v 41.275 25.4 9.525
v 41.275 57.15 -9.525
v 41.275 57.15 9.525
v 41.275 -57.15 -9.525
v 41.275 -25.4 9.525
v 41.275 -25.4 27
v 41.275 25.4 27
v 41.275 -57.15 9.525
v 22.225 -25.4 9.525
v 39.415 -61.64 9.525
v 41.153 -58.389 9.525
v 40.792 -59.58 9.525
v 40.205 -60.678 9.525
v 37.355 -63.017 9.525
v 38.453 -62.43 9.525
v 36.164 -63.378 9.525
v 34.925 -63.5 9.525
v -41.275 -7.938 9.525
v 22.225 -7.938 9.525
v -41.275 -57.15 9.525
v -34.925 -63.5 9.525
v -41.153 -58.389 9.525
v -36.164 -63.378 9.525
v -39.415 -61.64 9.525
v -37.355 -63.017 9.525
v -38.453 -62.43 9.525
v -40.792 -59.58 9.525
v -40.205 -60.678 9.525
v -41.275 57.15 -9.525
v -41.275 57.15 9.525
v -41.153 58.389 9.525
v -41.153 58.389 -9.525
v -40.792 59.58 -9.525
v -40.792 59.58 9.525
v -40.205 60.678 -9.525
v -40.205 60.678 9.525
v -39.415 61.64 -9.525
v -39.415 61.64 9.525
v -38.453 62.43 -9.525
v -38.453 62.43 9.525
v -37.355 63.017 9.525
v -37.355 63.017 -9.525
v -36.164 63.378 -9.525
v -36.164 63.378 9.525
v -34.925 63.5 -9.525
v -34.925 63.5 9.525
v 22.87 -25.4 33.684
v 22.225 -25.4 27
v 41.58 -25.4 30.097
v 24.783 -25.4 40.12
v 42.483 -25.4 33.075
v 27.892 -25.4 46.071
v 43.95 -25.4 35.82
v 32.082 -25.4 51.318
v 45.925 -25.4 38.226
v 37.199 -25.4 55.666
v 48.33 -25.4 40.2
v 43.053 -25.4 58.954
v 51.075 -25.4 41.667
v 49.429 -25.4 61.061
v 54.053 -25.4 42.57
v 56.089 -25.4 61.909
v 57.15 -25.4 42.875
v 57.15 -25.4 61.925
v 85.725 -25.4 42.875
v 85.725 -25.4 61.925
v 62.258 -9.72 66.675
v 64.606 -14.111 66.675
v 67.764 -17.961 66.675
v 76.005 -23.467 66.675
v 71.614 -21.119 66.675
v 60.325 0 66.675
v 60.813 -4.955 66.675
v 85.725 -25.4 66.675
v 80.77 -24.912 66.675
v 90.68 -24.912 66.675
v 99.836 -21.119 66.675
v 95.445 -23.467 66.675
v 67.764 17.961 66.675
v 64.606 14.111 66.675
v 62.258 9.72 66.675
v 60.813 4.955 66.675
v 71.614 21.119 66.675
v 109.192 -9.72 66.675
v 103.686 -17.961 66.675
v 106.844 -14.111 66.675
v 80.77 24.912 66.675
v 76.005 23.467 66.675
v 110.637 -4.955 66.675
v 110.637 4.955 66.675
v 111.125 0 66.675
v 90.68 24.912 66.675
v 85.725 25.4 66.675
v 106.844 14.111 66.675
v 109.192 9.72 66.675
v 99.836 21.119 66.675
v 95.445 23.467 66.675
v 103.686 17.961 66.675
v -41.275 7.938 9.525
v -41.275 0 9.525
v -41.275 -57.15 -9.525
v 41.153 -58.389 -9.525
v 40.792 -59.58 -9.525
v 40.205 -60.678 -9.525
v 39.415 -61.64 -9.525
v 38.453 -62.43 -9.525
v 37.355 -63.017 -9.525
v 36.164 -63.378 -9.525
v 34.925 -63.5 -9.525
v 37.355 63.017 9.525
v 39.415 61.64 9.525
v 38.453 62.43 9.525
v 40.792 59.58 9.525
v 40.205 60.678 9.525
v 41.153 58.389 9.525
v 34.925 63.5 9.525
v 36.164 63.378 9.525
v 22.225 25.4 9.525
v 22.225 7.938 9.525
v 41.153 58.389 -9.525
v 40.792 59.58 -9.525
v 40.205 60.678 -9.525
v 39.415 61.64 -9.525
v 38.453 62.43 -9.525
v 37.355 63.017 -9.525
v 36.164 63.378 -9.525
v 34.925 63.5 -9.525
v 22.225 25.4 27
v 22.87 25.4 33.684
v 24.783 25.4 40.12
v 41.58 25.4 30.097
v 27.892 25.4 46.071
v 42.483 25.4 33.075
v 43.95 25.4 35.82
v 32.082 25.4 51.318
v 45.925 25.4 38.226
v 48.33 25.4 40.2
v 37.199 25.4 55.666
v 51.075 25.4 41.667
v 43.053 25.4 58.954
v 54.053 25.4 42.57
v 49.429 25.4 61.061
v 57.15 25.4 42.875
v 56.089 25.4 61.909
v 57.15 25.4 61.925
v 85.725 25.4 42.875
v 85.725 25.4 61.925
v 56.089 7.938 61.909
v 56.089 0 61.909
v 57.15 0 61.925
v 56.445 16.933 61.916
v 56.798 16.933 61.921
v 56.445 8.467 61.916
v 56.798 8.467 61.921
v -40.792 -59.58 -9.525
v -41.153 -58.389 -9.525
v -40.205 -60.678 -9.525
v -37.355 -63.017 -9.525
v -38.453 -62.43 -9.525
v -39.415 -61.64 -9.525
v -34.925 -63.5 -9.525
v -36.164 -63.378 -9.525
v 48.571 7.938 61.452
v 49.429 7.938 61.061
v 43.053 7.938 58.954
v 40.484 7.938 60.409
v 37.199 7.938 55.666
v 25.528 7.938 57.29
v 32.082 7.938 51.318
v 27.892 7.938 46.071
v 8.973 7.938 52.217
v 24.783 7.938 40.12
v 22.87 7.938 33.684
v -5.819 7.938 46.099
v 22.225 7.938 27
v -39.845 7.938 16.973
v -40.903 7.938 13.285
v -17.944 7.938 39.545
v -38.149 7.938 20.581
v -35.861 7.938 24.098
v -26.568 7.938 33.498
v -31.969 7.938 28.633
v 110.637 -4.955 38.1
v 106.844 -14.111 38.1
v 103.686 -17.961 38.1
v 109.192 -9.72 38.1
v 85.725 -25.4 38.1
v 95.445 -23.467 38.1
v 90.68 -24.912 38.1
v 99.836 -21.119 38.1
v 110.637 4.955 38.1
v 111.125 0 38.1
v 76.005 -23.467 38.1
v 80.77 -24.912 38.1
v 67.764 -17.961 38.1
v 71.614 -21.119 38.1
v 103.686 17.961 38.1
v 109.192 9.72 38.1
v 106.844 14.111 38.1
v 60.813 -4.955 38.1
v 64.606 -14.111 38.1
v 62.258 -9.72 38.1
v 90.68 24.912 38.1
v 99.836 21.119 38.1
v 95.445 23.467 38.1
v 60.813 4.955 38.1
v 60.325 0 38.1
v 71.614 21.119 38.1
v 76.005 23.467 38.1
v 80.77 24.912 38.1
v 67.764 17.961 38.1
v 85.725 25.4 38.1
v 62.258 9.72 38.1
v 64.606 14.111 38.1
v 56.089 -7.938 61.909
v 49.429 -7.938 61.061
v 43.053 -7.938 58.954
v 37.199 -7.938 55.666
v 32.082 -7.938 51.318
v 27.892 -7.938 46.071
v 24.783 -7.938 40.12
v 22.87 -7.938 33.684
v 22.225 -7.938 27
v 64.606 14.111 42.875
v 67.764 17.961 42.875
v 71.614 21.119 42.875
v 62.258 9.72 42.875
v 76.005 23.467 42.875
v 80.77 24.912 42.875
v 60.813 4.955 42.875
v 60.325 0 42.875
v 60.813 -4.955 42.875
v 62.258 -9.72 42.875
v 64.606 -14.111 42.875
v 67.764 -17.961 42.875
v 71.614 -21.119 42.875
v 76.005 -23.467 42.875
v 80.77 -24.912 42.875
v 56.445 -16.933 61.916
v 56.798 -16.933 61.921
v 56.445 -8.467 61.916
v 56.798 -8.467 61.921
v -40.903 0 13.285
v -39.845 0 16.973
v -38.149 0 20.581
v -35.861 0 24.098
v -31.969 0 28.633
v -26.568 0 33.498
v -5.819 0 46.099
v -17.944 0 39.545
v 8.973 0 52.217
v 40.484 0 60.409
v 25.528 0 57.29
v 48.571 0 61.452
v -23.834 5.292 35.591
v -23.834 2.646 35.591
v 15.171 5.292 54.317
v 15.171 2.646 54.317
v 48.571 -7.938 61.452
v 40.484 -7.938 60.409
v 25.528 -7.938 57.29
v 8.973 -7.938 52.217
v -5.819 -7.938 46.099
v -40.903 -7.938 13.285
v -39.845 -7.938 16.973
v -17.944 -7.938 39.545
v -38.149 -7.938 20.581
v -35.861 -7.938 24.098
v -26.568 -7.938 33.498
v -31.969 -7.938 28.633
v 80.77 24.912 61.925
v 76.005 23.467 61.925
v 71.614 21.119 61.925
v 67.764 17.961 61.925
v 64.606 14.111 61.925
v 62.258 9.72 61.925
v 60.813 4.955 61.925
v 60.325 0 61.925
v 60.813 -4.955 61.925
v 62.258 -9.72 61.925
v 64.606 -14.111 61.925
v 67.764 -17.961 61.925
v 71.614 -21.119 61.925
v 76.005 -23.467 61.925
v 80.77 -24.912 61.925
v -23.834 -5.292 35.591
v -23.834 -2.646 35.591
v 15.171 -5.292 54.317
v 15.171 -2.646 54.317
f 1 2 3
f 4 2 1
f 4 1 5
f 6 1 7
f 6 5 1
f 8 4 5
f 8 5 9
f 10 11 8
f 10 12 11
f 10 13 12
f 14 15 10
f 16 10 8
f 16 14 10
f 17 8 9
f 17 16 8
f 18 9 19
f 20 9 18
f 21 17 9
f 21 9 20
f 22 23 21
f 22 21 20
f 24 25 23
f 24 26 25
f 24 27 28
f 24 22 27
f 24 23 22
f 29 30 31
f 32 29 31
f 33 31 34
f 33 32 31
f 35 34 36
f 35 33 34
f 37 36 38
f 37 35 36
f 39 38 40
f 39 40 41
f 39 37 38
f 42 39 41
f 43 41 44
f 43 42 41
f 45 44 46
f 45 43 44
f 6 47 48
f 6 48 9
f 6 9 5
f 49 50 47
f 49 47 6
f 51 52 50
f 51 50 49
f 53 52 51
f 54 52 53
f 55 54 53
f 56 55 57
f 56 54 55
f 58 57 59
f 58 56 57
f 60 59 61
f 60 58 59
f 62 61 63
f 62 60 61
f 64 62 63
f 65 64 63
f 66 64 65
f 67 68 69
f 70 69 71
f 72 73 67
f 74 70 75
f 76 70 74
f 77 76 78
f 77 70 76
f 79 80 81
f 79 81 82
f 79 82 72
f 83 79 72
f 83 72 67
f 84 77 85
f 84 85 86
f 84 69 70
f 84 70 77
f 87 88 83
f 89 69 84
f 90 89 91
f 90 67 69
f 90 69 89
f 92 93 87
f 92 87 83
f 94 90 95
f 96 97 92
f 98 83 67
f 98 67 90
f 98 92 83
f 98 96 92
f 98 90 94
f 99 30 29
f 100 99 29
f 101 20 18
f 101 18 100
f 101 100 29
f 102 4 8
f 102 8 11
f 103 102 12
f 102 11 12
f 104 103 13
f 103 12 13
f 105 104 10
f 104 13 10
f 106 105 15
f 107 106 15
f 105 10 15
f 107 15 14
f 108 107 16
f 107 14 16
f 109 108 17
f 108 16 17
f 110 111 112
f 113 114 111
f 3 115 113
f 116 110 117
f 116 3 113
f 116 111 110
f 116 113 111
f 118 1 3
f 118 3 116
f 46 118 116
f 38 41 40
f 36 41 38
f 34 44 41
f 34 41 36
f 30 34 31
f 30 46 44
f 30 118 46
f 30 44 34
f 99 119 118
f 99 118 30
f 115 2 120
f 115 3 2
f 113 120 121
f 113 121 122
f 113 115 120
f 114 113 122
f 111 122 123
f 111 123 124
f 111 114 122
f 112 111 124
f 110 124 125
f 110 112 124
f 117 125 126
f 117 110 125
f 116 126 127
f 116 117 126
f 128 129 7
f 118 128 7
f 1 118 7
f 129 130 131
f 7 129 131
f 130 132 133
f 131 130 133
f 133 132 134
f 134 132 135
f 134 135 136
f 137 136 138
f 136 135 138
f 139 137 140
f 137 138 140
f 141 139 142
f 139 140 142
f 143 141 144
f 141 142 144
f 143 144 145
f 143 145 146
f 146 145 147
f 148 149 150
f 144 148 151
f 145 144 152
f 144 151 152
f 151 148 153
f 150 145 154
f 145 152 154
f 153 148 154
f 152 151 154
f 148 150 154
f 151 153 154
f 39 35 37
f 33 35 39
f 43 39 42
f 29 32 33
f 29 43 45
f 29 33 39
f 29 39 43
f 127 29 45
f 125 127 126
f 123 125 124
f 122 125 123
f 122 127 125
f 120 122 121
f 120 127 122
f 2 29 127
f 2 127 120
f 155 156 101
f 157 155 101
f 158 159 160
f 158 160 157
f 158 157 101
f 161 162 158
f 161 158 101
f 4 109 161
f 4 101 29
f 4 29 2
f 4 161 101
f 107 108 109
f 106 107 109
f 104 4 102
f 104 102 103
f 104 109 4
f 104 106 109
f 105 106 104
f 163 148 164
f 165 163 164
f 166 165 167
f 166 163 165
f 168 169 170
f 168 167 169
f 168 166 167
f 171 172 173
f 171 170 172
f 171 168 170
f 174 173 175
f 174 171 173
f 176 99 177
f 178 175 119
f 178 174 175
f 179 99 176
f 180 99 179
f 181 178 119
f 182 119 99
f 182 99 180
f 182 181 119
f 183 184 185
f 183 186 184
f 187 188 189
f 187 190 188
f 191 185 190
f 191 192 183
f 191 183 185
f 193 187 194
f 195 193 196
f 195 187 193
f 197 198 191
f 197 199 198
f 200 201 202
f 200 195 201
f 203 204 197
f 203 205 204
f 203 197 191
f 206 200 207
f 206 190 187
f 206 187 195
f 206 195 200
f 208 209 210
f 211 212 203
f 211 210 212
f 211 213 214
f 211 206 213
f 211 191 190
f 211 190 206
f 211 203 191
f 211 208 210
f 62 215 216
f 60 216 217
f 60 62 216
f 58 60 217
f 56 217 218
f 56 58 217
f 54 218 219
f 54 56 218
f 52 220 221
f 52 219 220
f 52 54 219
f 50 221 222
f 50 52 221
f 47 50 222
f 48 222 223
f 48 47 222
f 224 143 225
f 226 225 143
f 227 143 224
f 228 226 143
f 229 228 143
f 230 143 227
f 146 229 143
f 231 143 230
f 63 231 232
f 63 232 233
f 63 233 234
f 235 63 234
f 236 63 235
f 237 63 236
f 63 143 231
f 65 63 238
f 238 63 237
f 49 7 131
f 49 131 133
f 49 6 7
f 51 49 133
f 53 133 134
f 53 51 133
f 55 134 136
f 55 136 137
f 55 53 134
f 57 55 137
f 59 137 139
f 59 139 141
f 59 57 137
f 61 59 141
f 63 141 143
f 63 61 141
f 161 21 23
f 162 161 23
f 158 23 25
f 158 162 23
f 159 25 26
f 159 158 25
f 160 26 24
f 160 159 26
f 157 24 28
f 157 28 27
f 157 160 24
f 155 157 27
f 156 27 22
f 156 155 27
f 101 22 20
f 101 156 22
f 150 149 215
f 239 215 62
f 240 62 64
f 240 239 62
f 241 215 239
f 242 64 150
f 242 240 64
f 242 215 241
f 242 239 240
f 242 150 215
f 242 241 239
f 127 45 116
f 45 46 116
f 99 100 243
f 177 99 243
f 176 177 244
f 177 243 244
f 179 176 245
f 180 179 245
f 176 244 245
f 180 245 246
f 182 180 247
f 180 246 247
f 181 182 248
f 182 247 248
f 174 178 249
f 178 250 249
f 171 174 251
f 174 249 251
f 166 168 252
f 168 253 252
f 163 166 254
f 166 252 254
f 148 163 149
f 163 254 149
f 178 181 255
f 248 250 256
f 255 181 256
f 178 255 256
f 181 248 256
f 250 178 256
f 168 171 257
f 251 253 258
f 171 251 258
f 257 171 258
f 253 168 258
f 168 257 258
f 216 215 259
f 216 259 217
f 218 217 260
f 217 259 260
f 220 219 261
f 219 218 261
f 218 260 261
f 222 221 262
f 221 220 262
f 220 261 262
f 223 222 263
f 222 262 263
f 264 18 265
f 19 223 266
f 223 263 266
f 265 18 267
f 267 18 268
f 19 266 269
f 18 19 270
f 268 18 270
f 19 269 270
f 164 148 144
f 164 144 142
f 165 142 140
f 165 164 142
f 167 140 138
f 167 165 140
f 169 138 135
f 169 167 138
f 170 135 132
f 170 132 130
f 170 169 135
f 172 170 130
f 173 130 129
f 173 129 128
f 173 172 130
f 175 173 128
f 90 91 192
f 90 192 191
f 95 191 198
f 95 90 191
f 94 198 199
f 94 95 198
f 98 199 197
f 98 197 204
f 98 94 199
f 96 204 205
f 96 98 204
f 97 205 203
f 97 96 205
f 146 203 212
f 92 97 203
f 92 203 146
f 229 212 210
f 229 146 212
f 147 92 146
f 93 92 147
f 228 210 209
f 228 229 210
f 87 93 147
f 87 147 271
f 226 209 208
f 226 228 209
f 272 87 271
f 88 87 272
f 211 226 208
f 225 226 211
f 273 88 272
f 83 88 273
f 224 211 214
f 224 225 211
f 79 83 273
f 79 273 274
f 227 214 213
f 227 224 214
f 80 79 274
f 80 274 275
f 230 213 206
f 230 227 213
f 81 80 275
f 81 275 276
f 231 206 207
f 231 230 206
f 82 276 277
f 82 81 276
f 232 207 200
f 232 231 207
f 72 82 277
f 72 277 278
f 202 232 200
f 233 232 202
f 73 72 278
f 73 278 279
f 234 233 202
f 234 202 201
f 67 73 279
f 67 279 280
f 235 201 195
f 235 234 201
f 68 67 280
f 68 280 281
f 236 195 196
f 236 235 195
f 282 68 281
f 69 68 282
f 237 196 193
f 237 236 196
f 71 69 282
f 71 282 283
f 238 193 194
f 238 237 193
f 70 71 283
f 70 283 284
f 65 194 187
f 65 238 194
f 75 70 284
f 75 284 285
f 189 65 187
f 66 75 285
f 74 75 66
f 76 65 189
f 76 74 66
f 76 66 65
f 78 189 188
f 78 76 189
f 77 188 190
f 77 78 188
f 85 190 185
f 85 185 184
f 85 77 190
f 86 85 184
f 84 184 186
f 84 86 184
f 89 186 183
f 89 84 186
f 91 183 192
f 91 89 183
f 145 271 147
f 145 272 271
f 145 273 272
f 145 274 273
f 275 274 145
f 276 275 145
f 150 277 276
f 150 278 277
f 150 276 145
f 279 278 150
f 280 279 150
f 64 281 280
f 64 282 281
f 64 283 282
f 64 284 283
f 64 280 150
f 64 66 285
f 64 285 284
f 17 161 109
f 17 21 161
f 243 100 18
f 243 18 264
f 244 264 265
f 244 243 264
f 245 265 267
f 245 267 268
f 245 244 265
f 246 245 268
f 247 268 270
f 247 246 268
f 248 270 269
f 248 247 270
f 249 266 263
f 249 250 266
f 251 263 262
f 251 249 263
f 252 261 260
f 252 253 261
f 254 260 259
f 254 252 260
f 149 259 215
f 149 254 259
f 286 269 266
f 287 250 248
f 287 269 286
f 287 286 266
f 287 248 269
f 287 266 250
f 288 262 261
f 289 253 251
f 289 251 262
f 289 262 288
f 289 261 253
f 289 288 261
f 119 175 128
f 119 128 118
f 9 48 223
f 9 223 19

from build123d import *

# Parameters (mm, degrees)
F1_DEPTH = 63.5
F0_W     = 25.4
F0_H     = 19.05
F2_DEPTH = 25.4
F3_DEPTH = 7.9375
F5_R     = 6.35


with BuildPart() as f1:
    # F0 (on Front) → F1 (new body, symmetric)
    with BuildSketch(Plane.XZ):
        Polygon((-41.275, -9.525), (41.275, -9.525), (41.275, 9.525), (22.225, 9.525), (-41.275, 9.525), align=None)
    extrude(amount=F1_DEPTH, both=True)

    # F0 (on Front) → F2 (join, symmetric)
    with BuildSketch(Plane.XZ):
        with Locations((73.025, 52.4002)):
            Rectangle(F0_W, F0_H)
        with BuildLine():
            Line((22.225, 9.525), (41.275, 9.525))
            Line((41.275, 9.525), (41.275, 27.0002))
            ThreePointArc((41.275, 27.0002), (45.9246798487, 38.2255201513), (57.15, 42.8752))
            Line((57.15, 42.8752), (60.325, 42.8752))
            Line((60.325, 42.8752), (60.325, 61.9252))
            Line((60.325, 61.9252), (57.15, 61.9252))
            add(Edge.make_bspline(
                [(56.0893351364, 61.9090902007), (56.4456274425, 61.9167445082), (56.7992126462, 61.9221202842), (57.15, 61.9252)],
                knots=[110.3910816618, 110.3910816618, 110.3910816618, 110.3910816618, 111.5045361635, 111.5045361635, 111.5045361635, 111.5045361635], degree=3))
            ThreePointArc((56.0893351364, 61.9090902007), (32.082098758, 51.3180114212), (22.225, 27.0002))
            Line((22.225, 27.0002), (22.225, 9.525))
        make_face()
    extrude(amount=F2_DEPTH, both=True)

    # F0 (on Front) → F3 (join, symmetric)
    with BuildSketch(Plane.XZ):
        with BuildLine():
            add(Edge.make_bspline(
                [(-41.275, 9.525), (-41.167300735, 37.9949573937), (20.7654911939, 61.1502201412), (56.0893351364, 61.9090902007)],
                knots=[0, 0, 0, 0, 110.3910816618, 110.3910816618, 110.3910816618, 110.3910816618], degree=3))
            Line((-41.275, 9.525), (22.225, 9.525))
            Line((22.225, 9.525), (22.225, 27.0002))
            ThreePointArc((22.225, 27.0002), (32.082098758, 51.3180114212), (56.0893351364, 61.9090902007))
        make_face()
    extrude(amount=F3_DEPTH, both=True)

    # F0 (on Front) → F4 (revolve)
    with BuildSketch(Plane.XZ):
        Polygon((85.725, 61.9252), (85.725, 42.8752), (85.725, 38.1), (111.125, 38.1), (111.125, 66.675), (85.725, 66.675), align=None)
    revolve(axis=Axis((85.725, 0, 52.3875), (0, 0, 1)))

    # F5
    f5_edges = [f1.edges().sort_by_distance(p)[0] for p in [
        (-41.275, -63.5, 0),
        (41.275, -63.5, 0),
        (41.275, 63.5, 0),
        (-41.275, 63.5, 0),
    ]]
    fillet(f5_edges, radius=F5_R)


solid = f1.part
